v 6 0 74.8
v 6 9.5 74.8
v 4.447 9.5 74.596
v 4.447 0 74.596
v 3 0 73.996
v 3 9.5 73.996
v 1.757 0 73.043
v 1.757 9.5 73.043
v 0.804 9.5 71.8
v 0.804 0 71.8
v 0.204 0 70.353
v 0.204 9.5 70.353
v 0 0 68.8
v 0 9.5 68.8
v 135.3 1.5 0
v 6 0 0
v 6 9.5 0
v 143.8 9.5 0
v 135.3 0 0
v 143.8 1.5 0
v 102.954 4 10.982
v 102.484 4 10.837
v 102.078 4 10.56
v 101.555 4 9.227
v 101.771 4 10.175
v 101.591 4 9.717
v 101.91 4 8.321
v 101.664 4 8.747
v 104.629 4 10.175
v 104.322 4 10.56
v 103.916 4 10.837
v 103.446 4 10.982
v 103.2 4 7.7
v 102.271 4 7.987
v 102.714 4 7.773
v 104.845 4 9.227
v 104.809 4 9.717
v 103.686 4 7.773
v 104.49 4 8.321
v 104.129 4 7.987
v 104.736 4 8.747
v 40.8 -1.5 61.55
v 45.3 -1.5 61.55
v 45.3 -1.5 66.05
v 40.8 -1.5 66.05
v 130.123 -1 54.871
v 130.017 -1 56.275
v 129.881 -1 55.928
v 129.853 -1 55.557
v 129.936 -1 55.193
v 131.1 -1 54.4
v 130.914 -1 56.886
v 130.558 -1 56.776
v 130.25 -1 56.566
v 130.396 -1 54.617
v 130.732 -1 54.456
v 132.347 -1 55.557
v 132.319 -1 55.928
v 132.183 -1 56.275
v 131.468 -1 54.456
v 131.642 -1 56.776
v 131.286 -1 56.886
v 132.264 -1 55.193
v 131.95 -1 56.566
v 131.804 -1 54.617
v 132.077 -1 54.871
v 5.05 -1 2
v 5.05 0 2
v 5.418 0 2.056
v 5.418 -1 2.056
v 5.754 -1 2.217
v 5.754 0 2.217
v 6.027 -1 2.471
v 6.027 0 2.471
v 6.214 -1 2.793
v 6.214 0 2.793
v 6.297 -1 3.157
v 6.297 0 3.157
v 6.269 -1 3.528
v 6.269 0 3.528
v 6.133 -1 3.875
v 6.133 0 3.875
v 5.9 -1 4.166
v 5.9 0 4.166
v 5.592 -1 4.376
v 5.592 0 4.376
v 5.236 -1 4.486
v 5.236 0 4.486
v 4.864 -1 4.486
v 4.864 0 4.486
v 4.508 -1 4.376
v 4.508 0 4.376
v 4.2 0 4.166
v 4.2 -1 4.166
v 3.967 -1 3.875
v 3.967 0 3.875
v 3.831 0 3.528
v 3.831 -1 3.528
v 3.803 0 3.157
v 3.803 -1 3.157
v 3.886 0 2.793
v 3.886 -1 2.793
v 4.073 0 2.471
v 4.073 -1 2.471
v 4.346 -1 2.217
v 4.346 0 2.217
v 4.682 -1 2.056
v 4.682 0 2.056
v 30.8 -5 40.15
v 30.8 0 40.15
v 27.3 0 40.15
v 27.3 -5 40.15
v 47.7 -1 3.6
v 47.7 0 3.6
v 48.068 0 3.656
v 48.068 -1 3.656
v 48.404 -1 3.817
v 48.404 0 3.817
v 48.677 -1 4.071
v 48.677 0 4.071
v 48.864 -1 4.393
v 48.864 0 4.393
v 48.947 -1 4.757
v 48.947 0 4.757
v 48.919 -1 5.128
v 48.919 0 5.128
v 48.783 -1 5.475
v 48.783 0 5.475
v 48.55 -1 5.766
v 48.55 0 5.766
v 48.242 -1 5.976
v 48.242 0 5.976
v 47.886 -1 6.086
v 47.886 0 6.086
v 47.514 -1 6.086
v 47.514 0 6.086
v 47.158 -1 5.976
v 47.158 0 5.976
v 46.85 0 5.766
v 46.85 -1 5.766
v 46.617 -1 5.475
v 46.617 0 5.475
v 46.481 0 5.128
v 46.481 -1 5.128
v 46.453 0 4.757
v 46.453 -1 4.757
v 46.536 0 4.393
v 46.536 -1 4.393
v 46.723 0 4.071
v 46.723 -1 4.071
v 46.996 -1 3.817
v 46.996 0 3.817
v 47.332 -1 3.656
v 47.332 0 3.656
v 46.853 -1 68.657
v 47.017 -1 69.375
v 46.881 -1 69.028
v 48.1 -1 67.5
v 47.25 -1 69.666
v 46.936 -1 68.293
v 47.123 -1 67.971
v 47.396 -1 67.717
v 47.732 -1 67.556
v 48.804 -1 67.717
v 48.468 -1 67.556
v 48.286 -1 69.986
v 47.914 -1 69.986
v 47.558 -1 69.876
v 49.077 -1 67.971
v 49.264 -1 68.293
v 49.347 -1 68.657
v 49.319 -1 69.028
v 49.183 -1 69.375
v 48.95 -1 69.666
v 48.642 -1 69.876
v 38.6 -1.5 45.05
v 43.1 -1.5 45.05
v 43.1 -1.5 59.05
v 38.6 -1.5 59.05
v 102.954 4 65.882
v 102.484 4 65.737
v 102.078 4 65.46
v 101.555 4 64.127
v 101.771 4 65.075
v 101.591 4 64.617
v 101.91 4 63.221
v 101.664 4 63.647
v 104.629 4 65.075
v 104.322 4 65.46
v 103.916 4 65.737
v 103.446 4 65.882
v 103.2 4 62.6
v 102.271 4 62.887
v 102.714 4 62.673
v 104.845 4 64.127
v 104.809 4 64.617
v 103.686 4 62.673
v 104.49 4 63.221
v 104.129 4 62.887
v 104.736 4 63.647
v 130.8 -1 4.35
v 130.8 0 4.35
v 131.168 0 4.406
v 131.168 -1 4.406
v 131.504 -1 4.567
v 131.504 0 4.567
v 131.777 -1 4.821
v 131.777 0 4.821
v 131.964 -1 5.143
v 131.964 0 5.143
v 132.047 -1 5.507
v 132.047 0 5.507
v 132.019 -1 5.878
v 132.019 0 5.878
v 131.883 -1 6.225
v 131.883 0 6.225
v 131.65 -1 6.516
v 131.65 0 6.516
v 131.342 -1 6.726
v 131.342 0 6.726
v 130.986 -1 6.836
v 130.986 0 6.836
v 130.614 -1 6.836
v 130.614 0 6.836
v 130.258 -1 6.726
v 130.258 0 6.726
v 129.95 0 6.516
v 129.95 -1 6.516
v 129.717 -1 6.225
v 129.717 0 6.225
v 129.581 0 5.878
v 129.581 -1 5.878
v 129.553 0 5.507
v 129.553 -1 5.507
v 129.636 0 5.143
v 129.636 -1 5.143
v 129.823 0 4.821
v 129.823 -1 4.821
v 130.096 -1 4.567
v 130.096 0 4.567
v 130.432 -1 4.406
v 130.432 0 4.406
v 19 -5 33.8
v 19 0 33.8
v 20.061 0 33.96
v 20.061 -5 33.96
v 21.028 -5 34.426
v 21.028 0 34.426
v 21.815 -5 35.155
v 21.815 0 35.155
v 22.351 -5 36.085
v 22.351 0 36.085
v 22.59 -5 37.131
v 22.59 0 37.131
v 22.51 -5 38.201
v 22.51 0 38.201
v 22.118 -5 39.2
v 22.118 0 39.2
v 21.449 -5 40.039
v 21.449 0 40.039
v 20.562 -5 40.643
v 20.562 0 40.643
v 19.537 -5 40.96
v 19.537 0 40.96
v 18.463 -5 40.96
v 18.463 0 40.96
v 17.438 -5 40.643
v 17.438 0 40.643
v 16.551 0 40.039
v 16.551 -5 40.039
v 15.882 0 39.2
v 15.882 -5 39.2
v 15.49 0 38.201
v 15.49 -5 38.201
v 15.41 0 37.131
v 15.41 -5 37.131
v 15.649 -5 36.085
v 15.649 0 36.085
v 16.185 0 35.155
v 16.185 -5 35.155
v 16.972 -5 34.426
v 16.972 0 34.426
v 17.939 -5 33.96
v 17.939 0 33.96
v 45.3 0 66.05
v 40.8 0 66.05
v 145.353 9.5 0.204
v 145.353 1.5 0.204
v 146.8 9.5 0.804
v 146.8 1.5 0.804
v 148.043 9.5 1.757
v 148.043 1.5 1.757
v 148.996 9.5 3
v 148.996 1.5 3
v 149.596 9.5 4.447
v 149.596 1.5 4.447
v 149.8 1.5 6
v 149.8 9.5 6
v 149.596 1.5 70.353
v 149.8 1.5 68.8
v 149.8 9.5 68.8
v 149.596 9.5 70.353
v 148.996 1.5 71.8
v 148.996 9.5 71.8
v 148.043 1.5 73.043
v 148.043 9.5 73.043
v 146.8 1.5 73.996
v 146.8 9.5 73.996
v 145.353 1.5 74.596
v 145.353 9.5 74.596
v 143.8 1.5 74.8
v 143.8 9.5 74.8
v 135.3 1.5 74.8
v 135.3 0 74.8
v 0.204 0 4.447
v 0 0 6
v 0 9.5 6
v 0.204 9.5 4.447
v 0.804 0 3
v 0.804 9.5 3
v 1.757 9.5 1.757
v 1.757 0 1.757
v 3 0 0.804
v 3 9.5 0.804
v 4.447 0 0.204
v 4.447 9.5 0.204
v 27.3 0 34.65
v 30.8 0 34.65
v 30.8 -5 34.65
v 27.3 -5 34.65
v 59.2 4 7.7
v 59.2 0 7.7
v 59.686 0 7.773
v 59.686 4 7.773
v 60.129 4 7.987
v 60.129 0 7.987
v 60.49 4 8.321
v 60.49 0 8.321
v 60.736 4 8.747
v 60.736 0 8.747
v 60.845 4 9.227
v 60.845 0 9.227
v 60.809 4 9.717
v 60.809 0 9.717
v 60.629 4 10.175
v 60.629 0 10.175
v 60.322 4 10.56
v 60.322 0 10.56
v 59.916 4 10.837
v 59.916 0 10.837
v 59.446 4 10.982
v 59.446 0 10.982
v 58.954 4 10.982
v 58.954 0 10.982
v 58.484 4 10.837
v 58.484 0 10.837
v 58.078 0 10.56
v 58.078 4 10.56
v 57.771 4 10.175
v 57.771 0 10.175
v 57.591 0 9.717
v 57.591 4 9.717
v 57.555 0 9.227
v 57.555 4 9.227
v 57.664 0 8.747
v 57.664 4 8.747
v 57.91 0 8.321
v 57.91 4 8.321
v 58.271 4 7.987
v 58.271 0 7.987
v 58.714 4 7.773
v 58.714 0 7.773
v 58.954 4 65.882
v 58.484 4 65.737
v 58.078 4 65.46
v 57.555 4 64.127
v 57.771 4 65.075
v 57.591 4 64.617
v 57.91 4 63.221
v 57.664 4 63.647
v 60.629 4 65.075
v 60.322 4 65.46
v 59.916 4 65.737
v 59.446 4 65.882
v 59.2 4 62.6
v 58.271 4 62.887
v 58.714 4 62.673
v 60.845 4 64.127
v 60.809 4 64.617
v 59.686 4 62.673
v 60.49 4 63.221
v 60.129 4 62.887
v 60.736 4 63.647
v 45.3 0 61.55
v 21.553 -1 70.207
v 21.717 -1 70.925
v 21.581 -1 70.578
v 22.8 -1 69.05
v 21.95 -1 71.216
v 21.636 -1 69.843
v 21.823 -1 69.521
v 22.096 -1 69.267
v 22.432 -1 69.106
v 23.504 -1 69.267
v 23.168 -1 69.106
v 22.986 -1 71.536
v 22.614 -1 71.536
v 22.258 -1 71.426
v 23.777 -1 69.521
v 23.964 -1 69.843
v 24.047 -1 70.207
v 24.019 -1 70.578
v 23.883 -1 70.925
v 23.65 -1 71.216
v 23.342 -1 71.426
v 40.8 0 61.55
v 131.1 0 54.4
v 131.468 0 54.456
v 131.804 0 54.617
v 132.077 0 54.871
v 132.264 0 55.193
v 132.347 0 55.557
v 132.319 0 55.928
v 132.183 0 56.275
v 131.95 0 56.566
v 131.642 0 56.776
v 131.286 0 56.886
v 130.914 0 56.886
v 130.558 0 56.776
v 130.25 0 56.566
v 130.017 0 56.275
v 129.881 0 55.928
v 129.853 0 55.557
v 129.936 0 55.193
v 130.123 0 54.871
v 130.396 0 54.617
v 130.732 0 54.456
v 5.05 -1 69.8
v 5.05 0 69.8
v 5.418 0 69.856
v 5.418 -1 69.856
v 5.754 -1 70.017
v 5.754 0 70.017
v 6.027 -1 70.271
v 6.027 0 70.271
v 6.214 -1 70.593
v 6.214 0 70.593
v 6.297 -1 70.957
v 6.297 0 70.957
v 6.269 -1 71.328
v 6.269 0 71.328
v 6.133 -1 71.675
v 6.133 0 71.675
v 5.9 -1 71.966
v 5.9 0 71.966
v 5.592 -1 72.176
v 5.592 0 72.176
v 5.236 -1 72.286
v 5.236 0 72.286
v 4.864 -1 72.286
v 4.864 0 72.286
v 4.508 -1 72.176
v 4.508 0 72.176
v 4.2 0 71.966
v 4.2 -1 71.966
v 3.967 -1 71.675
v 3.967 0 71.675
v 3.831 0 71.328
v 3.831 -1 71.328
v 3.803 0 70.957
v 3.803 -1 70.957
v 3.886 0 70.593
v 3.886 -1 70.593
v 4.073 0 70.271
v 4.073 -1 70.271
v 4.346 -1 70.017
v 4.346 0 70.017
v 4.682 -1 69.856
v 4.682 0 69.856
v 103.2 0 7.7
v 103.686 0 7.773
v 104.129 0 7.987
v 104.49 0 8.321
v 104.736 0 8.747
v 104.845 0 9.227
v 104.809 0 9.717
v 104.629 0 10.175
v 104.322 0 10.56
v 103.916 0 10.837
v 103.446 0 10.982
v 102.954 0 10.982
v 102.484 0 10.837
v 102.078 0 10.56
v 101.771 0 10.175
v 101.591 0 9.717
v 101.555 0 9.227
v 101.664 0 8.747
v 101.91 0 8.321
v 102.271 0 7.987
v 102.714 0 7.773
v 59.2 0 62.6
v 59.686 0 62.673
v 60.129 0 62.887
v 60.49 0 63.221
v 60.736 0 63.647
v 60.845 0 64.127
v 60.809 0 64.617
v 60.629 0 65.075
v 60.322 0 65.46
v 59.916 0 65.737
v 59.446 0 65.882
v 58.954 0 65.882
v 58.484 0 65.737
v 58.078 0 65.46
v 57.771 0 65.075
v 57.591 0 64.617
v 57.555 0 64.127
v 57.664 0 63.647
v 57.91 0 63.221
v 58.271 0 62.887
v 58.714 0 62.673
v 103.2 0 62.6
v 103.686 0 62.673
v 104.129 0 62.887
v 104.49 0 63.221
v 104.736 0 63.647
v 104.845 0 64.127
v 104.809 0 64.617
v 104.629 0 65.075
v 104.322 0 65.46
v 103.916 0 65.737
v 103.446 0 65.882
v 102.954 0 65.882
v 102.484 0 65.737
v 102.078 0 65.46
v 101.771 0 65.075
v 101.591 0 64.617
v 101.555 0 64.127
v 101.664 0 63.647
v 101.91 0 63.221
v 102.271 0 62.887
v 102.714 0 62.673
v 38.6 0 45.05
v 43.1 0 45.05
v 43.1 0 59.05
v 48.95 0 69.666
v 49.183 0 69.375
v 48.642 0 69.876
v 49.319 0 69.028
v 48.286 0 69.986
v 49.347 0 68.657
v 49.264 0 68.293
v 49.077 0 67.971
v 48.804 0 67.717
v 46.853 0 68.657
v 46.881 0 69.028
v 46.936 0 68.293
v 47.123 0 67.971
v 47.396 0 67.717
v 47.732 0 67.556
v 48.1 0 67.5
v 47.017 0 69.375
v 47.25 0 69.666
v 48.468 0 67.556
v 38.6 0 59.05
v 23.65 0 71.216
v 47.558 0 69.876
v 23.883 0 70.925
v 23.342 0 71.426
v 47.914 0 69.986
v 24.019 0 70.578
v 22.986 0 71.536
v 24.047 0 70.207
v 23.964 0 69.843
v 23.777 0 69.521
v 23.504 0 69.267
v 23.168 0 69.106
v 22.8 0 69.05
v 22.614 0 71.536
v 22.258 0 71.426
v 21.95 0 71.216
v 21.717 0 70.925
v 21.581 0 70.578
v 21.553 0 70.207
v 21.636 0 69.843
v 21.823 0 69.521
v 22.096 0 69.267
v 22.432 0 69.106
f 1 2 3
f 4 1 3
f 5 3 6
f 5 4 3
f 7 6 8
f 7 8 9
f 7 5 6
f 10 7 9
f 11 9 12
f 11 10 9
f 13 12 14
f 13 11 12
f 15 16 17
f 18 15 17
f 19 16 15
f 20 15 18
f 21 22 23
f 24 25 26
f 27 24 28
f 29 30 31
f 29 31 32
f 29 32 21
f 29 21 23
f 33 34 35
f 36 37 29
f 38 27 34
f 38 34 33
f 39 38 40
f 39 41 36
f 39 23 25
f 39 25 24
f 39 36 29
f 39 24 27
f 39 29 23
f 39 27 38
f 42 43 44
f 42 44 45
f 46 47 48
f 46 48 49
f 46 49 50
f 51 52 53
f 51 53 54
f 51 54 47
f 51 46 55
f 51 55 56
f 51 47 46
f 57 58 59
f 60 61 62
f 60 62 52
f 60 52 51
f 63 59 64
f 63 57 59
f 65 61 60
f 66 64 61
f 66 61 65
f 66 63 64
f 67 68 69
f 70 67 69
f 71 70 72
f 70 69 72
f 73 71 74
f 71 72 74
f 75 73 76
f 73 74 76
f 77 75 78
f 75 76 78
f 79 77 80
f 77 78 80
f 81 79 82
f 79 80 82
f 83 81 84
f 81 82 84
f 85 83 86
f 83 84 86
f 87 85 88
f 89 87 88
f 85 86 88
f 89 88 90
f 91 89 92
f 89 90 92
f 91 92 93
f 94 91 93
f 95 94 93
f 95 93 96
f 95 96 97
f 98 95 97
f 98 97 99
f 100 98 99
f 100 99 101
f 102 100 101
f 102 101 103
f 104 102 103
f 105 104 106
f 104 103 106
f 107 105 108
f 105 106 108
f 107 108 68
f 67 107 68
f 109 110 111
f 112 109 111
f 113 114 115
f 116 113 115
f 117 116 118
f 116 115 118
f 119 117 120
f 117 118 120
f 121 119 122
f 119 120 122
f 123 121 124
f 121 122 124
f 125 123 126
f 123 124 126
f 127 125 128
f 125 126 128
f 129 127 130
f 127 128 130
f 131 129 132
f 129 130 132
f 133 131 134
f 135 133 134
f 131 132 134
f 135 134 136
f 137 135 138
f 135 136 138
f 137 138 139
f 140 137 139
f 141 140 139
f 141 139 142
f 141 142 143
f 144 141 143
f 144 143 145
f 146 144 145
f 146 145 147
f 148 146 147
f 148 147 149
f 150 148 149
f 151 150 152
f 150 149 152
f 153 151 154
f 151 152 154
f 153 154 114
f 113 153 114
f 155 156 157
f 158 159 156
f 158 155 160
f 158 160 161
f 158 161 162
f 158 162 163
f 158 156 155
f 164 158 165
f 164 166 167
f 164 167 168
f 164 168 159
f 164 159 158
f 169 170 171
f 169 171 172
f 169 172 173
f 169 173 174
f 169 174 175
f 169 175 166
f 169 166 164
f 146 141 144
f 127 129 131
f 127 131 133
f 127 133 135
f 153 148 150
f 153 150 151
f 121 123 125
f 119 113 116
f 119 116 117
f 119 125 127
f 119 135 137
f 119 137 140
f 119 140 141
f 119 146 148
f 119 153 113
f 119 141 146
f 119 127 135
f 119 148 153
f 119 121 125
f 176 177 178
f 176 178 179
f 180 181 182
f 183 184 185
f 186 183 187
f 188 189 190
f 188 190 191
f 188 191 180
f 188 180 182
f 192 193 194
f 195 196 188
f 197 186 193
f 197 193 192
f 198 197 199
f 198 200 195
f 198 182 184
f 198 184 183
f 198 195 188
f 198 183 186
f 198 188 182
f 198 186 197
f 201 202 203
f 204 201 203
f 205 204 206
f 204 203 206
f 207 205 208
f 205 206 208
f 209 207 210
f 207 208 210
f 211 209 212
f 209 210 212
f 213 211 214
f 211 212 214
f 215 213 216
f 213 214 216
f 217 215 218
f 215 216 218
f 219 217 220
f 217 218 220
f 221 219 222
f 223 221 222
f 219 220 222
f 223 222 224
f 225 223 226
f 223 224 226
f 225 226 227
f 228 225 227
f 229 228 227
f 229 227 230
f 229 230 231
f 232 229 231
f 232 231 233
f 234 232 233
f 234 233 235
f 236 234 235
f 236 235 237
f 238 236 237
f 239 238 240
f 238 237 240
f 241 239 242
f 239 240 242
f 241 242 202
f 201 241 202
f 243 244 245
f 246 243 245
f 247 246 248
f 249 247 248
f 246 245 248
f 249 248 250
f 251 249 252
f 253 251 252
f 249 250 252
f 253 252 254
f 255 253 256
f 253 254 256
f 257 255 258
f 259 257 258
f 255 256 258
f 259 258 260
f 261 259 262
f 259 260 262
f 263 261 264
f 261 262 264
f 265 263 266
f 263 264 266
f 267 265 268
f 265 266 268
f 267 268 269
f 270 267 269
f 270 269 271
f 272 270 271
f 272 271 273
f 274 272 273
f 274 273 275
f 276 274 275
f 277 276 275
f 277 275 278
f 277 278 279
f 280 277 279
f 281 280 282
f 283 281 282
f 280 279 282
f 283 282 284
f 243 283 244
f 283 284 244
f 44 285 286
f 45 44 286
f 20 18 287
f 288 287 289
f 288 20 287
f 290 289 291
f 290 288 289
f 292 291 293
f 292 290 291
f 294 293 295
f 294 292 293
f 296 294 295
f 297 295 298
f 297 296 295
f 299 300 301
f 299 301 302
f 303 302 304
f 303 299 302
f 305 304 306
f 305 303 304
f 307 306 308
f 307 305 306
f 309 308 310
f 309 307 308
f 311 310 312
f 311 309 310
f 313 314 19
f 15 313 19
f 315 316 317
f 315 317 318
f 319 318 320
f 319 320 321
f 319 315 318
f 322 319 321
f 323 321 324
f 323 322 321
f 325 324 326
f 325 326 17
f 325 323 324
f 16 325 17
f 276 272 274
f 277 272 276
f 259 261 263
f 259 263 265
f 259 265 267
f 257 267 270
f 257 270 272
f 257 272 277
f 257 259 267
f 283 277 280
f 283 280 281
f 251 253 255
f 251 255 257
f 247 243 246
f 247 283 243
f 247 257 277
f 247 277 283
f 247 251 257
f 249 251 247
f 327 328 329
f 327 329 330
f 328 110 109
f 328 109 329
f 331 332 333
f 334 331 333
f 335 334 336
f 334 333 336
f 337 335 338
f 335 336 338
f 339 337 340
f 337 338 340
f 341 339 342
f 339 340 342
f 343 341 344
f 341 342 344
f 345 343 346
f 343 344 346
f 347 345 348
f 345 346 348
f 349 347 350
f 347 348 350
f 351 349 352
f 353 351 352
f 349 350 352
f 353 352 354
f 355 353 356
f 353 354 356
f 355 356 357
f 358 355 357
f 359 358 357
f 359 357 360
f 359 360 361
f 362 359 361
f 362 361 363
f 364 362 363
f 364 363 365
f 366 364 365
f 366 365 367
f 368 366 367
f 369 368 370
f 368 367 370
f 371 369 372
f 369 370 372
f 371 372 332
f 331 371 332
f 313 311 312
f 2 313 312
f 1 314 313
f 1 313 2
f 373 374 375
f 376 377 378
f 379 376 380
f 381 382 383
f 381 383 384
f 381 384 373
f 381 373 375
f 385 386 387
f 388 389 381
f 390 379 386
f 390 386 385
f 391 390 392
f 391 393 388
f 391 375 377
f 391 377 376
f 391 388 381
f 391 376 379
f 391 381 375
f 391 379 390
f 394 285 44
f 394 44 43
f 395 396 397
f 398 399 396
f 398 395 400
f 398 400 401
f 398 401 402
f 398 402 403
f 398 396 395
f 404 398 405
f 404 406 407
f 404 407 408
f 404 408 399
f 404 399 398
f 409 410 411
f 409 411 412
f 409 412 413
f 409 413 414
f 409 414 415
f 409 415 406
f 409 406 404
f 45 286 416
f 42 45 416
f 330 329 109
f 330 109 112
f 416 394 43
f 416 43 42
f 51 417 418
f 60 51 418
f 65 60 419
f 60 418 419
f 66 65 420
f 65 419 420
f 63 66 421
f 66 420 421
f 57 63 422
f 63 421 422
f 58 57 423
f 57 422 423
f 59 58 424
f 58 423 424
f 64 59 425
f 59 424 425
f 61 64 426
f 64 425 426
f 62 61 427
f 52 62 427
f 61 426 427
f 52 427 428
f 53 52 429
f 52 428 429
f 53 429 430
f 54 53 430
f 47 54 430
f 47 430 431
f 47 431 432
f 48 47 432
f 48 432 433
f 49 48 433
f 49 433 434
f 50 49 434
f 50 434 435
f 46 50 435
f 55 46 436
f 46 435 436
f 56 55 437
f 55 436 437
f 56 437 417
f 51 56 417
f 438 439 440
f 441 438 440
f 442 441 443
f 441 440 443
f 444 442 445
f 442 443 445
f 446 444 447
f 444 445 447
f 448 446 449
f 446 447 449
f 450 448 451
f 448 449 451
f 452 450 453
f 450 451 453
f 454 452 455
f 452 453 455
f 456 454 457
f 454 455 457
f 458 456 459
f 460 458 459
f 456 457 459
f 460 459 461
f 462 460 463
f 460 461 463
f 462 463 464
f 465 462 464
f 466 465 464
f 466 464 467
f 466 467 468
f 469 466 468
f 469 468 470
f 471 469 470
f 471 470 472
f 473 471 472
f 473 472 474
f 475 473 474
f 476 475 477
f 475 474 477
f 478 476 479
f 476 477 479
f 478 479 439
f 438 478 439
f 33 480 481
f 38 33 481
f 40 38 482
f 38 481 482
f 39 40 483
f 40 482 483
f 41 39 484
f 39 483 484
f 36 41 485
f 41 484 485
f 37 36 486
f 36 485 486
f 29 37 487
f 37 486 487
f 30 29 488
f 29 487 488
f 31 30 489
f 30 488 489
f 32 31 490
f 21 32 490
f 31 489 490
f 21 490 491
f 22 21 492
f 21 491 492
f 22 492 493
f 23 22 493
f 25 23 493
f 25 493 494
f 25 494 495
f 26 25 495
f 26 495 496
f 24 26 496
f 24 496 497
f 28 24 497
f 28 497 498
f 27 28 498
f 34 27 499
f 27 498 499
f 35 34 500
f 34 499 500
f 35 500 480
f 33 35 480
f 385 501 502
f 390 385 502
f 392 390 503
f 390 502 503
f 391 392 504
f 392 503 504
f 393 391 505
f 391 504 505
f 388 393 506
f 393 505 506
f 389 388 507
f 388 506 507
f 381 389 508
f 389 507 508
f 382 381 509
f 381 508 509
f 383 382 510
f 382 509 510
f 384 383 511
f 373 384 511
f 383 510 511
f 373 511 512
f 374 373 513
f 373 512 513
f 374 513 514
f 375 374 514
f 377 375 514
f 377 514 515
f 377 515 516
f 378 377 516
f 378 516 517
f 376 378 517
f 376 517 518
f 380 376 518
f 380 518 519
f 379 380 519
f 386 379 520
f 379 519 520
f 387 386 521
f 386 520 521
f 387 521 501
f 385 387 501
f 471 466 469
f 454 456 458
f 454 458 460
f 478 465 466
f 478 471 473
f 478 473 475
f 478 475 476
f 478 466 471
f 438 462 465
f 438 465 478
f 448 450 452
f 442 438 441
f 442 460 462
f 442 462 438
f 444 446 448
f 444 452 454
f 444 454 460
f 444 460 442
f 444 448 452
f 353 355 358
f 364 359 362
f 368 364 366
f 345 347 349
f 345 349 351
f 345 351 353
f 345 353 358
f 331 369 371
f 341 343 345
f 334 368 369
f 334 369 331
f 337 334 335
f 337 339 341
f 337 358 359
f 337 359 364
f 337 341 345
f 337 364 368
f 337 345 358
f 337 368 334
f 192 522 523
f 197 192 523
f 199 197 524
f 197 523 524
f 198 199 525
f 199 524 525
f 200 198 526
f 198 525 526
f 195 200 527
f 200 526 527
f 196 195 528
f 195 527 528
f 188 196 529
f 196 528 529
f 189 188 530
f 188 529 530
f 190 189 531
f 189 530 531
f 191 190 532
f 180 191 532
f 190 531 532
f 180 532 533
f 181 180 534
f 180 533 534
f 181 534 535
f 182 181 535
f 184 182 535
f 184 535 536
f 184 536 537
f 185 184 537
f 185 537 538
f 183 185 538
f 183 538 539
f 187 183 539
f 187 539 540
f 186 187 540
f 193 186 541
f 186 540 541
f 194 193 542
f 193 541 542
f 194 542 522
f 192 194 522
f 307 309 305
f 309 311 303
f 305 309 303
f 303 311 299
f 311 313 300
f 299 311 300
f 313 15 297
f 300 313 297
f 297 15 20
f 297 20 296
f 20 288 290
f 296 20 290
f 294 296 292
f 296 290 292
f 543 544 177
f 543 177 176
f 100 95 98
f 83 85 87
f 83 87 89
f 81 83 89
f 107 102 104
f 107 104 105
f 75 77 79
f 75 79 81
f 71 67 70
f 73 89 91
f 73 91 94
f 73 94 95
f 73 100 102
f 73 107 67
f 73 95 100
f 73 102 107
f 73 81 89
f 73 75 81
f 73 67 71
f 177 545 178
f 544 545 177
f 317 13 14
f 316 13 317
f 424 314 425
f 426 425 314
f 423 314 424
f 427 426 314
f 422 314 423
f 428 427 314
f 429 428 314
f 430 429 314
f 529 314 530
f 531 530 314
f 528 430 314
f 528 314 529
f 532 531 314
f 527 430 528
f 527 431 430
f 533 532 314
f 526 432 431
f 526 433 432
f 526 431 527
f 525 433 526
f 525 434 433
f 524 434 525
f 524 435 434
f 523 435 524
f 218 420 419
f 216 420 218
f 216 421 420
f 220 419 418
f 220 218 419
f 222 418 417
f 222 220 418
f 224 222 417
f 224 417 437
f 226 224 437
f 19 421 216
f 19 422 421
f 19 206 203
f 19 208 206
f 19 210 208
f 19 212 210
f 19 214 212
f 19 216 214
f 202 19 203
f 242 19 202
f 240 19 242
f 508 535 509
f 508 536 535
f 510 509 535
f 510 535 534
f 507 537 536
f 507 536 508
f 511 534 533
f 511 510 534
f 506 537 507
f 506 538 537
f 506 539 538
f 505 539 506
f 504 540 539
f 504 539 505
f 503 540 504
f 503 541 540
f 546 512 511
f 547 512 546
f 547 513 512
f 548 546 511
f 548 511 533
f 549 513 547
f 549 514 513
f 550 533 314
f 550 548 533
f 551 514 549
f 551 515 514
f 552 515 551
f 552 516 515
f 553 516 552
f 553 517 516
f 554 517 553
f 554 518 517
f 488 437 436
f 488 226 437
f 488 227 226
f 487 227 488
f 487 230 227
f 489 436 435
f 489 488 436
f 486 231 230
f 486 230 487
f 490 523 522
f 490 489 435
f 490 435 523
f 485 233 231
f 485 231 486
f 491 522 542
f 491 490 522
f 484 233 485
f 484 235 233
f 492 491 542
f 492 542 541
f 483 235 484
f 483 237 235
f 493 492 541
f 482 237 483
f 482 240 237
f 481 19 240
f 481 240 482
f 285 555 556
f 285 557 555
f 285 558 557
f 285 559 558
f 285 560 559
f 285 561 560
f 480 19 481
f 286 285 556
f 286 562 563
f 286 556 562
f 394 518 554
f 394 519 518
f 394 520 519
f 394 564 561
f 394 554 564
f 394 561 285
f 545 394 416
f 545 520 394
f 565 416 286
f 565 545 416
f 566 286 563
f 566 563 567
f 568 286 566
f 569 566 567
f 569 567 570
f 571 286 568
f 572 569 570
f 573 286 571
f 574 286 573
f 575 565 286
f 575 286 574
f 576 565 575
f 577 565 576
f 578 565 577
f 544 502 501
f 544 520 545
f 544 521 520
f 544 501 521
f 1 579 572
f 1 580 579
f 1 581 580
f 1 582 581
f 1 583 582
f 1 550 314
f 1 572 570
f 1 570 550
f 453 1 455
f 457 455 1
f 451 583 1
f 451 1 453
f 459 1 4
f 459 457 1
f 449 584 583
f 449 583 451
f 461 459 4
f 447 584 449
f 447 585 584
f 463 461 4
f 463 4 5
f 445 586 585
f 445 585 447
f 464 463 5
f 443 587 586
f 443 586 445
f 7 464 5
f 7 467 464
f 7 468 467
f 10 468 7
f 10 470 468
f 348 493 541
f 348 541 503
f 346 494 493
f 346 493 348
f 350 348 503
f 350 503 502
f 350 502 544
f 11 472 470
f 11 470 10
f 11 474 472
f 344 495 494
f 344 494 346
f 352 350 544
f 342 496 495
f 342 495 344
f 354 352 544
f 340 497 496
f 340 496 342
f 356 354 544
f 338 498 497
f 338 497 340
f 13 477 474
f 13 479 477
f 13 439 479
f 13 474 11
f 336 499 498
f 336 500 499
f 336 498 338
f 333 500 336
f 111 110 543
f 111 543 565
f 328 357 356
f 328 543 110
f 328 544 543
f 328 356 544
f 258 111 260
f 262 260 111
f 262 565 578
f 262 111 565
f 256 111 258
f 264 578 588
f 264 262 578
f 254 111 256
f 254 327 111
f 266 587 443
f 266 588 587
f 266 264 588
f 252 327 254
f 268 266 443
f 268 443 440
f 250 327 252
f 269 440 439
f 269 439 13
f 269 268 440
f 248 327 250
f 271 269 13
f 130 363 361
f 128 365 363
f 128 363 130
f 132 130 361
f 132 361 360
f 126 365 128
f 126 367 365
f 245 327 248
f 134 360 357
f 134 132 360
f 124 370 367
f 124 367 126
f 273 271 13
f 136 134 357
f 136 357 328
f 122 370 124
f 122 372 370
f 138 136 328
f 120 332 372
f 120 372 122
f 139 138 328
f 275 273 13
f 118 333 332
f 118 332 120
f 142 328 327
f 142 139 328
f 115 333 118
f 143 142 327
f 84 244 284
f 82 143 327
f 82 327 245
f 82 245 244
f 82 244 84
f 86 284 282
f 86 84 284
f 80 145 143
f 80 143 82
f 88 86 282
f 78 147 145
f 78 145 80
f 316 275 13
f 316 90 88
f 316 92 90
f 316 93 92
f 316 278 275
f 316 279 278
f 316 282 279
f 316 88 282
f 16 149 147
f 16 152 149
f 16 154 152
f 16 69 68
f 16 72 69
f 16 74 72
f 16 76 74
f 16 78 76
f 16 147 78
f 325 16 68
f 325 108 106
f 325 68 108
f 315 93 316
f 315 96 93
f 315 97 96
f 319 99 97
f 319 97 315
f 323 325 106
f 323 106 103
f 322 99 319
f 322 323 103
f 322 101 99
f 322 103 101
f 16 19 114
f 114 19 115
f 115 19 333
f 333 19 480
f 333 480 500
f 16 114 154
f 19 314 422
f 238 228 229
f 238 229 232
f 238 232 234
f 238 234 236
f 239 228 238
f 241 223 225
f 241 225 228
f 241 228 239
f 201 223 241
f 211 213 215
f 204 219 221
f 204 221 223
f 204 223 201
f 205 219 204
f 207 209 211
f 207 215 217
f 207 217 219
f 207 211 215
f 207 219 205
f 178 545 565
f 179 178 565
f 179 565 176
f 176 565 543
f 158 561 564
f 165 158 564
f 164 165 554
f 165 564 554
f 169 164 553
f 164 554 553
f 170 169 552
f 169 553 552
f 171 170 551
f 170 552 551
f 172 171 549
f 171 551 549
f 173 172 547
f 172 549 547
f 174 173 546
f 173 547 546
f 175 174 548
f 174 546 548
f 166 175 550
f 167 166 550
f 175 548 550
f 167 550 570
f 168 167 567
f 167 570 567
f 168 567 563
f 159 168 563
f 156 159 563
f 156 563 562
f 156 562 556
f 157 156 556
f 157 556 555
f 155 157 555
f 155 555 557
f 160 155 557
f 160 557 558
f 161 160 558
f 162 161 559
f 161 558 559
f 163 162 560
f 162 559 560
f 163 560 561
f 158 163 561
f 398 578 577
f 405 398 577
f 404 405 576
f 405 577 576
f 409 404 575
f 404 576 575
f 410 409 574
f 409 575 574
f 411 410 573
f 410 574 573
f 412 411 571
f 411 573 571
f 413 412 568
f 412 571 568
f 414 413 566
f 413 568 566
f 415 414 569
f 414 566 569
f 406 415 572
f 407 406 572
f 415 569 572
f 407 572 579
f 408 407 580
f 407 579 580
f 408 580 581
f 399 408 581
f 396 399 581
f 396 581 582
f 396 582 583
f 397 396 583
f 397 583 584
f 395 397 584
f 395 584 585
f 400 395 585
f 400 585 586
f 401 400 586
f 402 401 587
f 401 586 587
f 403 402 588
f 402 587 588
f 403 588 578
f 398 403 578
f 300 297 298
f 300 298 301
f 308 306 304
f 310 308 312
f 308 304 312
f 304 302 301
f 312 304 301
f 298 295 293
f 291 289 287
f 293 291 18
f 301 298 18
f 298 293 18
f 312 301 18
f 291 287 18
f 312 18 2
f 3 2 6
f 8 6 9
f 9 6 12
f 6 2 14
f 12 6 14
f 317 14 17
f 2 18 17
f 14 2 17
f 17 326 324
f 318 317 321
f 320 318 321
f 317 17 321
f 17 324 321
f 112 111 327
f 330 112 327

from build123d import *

# Parameters (mm, degrees)
EXTRUDE_1_DEPTH     = 9.5
SKETCH_2_5_W        = 4.5
SKETCH_2_5_H        = 14
SKETCH_2_5_H_2      = 4.5
EXTRUDE_5_DEPTH     = 1.5
SKETCH_2_6_R        = 1.25
EXTRUDE_6_DEPTH     = 1
SKETCH_2_7_R        = 1.65
CUT_EXTRUDE_1_DEPTH = 4
SKETCH_3_W          = 14.5
SKETCH_3_H          = 74.8
CUT_EXTRUDE_2_DEPTH = 1.5
SKETCH_2_R          = 3.6
SKETCH_2_W          = 3.5
SKETCH_2_H          = 5.5
EXTRUDE_7_DEPTH     = 5


with BuildPart() as part:
    # 草图1 → 凸台-拉伸1 (new body)
    with BuildSketch(Plane(origin=(0, 0, 0), x_dir=(1, 0, 0), z_dir=(0, 1, 0))):
        with BuildLine():
            Line((6, 0), (143.8, 0))
            ThreePointArc((143.8, 0), (148.042640687, -1.757359313), (149.8, -6))
            Line((149.8, -6), (149.8, -68.8))
            ThreePointArc((149.8, -68.8), (148.042640687, -73.042640687), (143.8, -74.8))
            Line((143.8, -74.8), (6, -74.8))
            ThreePointArc((6, -74.8), (1.757359313, -73.042640687), (0, -68.8))
            Line((0, -68.8), (0, -6))
            ThreePointArc((0, -6), (1.757359313, -1.757359313), (6, 0))
        make_face()
    extrude(amount=EXTRUDE_1_DEPTH)

    # 草图2<5> → 凸台-拉伸5 (add)
    with BuildSketch(Plane(origin=(0, 0, 0), x_dir=(-1, 0, 0), z_dir=(0, -1, 0))):
        with Locations((-40.85, -52.05)):
            Rectangle(SKETCH_2_5_W, SKETCH_2_5_H)
        with Locations((-43.05, -63.8)):
            Rectangle(SKETCH_2_5_W, SKETCH_2_5_H_2)
    extrude(amount=EXTRUDE_5_DEPTH)

    # 草图2<6> → 凸台-拉伸6 (add)
    with BuildSketch(Plane(origin=(0, 0, 0), x_dir=(-1, 0, 0), z_dir=(0, -1, 0))):
        with Locations((-130.8, -5.6)):
            Circle(SKETCH_2_6_R)
        with Locations((-131.1, -55.65)):
            Circle(SKETCH_2_6_R)
        with Locations((-47.7, -4.85)):
            Circle(SKETCH_2_6_R)
        with Locations((-48.1, -68.75)):
            Circle(SKETCH_2_6_R)
        with Locations((-22.8, -70.3)):
            Circle(SKETCH_2_6_R)
        with Locations((-5.05, -71.05)):
            Circle(SKETCH_2_6_R)
        with Locations((-5.05, -3.25)):
            Circle(SKETCH_2_6_R)
    extrude(amount=EXTRUDE_6_DEPTH)

    # 草图2<7> → 切除-拉伸1 (cut)
    with BuildSketch(Plane(origin=(0, 0, 0), x_dir=(-1, 0, 0), z_dir=(0, -1, 0))):
        with Locations((-103.2, -9.35)):
            Circle(SKETCH_2_7_R)
        with Locations((-103.2, -64.25)):
            Circle(SKETCH_2_7_R)
        with Locations((-59.2, -64.25)):
            Circle(SKETCH_2_7_R)
        with Locations((-59.2, -9.35)):
            Circle(SKETCH_2_7_R)
    extrude(amount=-CUT_EXTRUDE_1_DEPTH, mode=Mode.SUBTRACT)

    # 草图3 → 切除-拉伸2 (cut)
    with BuildSketch(Plane(origin=(0, 0, 0), x_dir=(1, 0, 0), z_dir=(0, 1, 0))):
        with Locations((142.55, -37.4)):
            Rectangle(SKETCH_3_W, SKETCH_3_H)
    extrude(amount=CUT_EXTRUDE_2_DEPTH, mode=Mode.SUBTRACT)

    # 草图2 → 凸台-拉伸7 (add)
    with BuildSketch(Plane(origin=(0, 0, 0), x_dir=(-1, 0, 0), z_dir=(0, -1, 0))):
        with Locations((-19, -37.4)):
            Circle(SKETCH_2_R)
        with Locations((-29.05, -37.4)):
            Rectangle(SKETCH_2_W, SKETCH_2_H)
    extrude(amount=EXTRUDE_7_DEPTH)


solid = part.part
